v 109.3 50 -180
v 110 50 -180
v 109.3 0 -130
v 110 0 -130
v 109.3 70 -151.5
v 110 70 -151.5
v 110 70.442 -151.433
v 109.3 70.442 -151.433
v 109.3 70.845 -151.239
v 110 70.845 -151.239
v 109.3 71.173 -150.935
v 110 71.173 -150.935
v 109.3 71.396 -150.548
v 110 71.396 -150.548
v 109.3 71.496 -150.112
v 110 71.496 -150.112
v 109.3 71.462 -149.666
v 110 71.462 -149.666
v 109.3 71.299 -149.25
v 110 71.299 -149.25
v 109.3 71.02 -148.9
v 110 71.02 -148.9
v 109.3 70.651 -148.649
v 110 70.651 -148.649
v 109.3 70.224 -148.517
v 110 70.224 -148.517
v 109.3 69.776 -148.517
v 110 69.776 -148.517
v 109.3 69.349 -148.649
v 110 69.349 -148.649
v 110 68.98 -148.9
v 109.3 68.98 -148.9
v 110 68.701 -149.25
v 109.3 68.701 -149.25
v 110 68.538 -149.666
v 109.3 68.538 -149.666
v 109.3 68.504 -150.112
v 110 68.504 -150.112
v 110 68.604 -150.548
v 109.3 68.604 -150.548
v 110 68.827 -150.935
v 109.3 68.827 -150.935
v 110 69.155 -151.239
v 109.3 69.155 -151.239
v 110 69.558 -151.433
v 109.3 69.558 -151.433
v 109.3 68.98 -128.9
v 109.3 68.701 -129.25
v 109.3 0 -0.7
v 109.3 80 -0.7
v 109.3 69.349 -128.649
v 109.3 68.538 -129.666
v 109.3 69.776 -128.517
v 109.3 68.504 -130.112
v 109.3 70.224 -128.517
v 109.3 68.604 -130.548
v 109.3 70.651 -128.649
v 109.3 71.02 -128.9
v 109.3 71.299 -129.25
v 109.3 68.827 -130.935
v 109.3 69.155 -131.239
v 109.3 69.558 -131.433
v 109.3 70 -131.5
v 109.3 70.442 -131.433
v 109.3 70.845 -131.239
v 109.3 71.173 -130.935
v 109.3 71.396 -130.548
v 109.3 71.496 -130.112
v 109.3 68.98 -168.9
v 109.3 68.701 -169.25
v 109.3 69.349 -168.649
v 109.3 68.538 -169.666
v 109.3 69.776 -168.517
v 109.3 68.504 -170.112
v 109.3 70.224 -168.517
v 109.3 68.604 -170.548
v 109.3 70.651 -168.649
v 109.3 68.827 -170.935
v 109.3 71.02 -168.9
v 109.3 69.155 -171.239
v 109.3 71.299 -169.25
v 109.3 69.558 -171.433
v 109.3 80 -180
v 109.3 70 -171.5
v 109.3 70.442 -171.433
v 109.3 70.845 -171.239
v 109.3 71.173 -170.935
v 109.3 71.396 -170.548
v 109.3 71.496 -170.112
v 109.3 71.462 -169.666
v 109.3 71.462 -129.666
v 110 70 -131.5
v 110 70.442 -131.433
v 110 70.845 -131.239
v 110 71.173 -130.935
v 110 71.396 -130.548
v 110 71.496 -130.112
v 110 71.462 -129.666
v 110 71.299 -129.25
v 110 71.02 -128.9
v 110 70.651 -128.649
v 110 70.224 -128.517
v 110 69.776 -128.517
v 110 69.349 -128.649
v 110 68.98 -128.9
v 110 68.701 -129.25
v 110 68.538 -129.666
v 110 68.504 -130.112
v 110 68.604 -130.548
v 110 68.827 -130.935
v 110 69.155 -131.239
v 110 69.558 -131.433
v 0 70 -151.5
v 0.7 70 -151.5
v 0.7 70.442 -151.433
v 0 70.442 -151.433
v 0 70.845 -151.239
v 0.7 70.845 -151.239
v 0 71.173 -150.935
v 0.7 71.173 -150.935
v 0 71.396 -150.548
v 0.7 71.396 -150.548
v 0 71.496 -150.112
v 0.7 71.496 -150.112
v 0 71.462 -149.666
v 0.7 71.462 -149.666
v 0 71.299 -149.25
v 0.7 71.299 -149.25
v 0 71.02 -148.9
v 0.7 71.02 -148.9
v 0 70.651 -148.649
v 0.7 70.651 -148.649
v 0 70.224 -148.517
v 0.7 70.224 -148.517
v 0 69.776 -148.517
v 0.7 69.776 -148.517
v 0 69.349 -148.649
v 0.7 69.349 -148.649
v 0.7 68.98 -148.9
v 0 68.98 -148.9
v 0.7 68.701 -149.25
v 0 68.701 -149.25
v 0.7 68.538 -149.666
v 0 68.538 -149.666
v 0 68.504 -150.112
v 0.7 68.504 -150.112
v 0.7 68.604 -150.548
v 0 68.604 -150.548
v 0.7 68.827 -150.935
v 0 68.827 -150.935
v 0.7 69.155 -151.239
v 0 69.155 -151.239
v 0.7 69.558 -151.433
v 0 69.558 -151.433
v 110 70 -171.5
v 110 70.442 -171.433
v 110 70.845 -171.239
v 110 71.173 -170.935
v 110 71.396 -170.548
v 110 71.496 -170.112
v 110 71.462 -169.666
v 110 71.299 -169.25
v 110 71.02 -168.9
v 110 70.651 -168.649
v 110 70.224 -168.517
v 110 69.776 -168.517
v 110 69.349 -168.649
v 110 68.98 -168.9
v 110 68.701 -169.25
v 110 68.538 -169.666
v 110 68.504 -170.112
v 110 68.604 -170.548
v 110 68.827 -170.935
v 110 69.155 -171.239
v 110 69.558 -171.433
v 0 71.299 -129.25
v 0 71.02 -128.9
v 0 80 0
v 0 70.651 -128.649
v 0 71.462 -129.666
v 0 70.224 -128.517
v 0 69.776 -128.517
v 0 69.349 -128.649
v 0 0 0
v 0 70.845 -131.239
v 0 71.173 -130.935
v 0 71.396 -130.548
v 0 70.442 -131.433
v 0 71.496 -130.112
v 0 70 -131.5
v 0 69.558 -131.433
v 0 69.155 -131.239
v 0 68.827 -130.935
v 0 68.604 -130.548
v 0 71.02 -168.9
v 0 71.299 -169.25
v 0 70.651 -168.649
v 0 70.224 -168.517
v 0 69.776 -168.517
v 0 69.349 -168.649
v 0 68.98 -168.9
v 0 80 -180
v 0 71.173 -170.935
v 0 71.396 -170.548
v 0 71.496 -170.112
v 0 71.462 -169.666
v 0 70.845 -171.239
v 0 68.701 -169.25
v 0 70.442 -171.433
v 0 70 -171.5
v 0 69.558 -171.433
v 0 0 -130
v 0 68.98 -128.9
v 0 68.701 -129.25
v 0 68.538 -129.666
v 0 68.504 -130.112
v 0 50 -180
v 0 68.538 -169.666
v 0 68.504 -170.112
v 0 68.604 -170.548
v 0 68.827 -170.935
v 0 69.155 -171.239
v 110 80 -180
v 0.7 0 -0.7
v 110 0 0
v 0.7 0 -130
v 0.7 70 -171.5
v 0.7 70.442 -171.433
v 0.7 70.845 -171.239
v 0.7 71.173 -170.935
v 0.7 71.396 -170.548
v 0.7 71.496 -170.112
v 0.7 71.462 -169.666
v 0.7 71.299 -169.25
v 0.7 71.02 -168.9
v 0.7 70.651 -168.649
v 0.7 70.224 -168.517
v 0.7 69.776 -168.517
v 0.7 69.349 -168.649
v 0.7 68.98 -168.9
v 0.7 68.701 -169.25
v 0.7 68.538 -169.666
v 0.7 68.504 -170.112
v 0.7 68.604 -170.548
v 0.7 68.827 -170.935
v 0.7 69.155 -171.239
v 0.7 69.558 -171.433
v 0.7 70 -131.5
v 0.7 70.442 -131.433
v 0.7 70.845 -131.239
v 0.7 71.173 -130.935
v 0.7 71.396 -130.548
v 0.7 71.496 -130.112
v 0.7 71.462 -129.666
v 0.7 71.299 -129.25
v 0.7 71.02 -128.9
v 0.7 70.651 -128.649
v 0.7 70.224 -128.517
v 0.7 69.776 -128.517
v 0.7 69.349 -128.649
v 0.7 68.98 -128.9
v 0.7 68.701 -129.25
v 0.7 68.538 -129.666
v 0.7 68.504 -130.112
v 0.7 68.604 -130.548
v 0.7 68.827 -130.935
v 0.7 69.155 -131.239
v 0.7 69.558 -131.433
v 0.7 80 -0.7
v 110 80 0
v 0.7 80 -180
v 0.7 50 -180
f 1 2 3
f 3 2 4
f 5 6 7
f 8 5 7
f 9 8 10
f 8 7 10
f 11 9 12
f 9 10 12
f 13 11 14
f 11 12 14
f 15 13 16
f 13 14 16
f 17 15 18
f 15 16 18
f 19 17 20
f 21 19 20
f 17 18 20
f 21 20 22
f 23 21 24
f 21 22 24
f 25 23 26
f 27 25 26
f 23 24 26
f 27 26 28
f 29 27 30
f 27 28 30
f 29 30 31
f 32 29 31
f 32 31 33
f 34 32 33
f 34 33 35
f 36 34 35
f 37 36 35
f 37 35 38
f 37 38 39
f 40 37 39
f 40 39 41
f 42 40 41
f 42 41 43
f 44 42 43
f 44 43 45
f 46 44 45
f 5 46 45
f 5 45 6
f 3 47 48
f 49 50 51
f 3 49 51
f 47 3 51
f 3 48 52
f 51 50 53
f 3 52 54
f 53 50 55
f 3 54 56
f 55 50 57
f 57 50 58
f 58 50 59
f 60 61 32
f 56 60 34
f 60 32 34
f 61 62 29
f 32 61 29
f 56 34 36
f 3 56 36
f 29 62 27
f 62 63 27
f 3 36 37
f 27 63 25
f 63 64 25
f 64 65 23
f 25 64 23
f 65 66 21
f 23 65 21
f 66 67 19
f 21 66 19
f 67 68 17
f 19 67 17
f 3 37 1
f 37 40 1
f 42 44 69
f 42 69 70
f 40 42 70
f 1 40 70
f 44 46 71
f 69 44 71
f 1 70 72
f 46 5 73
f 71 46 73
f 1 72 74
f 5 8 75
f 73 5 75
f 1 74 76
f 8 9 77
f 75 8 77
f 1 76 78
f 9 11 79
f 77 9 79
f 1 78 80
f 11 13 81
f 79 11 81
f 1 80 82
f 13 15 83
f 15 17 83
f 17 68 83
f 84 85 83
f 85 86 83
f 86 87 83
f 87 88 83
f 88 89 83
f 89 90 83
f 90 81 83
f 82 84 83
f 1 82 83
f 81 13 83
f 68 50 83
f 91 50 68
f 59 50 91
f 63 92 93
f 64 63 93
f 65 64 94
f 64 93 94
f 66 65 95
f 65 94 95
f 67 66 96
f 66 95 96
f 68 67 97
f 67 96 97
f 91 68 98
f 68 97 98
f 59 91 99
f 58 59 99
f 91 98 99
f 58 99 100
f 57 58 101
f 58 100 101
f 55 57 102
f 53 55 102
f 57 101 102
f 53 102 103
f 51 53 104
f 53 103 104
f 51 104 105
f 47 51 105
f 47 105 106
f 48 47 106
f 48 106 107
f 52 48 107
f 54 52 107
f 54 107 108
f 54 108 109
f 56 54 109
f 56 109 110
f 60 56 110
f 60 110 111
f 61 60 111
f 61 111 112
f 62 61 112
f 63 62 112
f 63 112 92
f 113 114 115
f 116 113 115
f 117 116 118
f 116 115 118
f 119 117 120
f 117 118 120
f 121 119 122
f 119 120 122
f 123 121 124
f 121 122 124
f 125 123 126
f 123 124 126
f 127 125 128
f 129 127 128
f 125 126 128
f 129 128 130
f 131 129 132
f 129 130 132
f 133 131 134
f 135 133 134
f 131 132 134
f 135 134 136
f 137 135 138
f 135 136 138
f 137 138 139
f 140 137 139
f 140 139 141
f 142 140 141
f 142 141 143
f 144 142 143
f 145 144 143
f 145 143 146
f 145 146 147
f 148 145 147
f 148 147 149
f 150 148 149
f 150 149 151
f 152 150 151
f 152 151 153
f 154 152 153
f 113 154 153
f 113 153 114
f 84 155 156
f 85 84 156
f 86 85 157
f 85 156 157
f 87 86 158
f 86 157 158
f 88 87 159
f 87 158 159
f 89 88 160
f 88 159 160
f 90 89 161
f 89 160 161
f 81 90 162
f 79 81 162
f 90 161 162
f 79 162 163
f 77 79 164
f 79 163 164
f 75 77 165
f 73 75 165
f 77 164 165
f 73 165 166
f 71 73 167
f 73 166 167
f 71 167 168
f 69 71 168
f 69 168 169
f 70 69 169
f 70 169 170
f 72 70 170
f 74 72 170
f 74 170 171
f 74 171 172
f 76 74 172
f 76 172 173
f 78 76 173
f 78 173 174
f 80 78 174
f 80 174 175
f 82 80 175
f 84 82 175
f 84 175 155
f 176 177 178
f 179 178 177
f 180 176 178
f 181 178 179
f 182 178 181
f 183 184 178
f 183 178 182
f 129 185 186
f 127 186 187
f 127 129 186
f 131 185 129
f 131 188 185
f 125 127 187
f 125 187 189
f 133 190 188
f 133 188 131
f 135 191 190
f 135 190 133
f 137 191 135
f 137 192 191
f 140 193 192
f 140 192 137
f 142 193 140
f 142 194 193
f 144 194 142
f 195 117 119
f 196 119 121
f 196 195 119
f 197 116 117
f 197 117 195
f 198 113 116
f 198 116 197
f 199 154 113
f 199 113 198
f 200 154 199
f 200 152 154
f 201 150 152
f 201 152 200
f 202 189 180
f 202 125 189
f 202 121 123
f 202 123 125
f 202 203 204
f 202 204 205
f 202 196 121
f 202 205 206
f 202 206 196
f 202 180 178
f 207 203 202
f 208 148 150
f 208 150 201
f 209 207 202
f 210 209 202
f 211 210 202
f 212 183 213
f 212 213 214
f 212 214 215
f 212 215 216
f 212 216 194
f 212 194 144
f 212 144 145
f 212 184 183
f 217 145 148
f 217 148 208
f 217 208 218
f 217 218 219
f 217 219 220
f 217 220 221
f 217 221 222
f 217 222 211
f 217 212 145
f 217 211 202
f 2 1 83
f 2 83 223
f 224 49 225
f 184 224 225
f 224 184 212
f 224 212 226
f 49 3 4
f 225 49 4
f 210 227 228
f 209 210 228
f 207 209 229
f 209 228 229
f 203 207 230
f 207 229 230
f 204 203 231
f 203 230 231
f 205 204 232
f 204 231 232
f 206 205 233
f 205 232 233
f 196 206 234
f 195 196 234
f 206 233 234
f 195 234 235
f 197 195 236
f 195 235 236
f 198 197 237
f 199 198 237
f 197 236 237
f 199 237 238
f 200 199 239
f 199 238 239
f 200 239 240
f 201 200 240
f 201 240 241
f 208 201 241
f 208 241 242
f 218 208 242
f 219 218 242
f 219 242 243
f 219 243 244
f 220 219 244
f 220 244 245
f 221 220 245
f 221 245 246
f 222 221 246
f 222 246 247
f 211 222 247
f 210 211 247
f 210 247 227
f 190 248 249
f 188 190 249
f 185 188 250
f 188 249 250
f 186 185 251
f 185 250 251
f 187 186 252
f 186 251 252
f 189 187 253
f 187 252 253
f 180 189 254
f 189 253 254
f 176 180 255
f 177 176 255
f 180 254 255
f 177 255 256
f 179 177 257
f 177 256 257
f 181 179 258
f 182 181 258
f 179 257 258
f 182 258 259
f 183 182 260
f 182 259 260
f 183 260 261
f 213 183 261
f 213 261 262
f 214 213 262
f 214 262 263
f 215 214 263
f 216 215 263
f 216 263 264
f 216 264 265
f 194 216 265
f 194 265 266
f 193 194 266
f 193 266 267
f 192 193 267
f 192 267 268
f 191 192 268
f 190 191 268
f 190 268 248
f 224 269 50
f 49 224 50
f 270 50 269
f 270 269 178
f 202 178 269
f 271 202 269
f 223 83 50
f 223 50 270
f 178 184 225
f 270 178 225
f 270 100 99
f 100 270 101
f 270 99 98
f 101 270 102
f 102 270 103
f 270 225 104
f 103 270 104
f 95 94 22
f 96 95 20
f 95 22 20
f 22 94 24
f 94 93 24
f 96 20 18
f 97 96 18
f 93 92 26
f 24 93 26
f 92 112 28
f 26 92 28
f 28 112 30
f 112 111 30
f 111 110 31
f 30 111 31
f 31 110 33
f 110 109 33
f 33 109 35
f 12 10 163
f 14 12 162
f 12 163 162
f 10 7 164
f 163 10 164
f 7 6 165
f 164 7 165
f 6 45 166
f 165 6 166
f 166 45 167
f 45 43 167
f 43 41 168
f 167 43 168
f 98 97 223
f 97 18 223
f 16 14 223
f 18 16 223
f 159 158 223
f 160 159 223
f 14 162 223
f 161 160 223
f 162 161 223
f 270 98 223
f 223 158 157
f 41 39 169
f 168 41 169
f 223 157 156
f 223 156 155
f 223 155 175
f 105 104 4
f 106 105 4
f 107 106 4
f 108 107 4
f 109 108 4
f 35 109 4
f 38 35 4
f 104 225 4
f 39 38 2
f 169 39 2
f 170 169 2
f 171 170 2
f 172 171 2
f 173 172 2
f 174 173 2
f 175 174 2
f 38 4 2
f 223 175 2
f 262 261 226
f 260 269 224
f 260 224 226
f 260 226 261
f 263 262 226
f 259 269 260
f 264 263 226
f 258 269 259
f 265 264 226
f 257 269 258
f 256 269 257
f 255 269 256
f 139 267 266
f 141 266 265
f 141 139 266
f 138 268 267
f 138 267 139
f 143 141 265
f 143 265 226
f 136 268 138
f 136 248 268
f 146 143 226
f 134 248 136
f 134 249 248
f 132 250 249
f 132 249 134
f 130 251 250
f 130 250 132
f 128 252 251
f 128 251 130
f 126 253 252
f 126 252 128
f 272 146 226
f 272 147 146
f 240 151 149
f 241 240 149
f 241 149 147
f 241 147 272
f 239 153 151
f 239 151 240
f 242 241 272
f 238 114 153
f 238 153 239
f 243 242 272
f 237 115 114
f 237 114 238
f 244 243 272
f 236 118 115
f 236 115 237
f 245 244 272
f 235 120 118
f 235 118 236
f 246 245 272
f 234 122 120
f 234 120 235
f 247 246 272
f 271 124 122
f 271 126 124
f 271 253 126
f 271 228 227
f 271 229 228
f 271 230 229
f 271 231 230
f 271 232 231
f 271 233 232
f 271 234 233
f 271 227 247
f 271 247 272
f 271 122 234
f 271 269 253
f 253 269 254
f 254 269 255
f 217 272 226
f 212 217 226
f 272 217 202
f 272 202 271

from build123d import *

# Parameters (mm, degrees)
SKETCH1_W           = 110
SKETCH1_H           = 180
BOSS_EXTRUDE1_DEPTH = 80
SKETCH2_W           = 108.6
SKETCH2_H           = 179.3
CUT_EXTRUDE1_DEPTH  = 226.610283454
SKETCH4_R           = 1.5
CUT_EXTRUDE3_DEPTH  = 226.610283454
CUT_EXTRUDE5_DEPTH  = 226.610283454


with BuildPart() as part:
    # Sketch1 → Boss-Extrude1 (new body)
    with BuildSketch(Plane(origin=(0, 0, 0), x_dir=(1, 0, 0), z_dir=(0, 1, 0))):
        with Locations((55, 90)):
            Rectangle(SKETCH1_W, SKETCH1_H)
    extrude(amount=BOSS_EXTRUDE1_DEPTH)

    # Sketch2 → Cut-Extrude1 (cut, through all)
    with BuildSketch(Plane(origin=(0, 80, 0), x_dir=(1, 0, 0), z_dir=(0, 1, 0))):
        with Locations((55, 90.35)):
            Rectangle(SKETCH2_W, SKETCH2_H)
    extrude(amount=-CUT_EXTRUDE1_DEPTH, mode=Mode.SUBTRACT)

    # Sketch4 → Cut-Extrude3 (cut, through all)
    with BuildSketch(Plane(origin=(110, 0, 0), x_dir=(0, 0, -1), z_dir=(1, 0, 0))):
        with Locations((170, 70)):
            Circle(SKETCH4_R)
        with Locations((130, 70)):
            Circle(SKETCH4_R)
        with Locations((150, 70)):
            Circle(SKETCH4_R)
    extrude(amount=-CUT_EXTRUDE3_DEPTH, mode=Mode.SUBTRACT)

    # Sketch8 → Cut-Extrude5 (cut, through all)
    with BuildSketch(Plane(origin=(110, 0, 0), x_dir=(0, 0, -1), z_dir=(1, 0, 0))):
        Polygon((180, 50), (130, 0), (180, 0), align=None)
    extrude(amount=-CUT_EXTRUDE5_DEPTH, mode=Mode.SUBTRACT)


solid = part.part
